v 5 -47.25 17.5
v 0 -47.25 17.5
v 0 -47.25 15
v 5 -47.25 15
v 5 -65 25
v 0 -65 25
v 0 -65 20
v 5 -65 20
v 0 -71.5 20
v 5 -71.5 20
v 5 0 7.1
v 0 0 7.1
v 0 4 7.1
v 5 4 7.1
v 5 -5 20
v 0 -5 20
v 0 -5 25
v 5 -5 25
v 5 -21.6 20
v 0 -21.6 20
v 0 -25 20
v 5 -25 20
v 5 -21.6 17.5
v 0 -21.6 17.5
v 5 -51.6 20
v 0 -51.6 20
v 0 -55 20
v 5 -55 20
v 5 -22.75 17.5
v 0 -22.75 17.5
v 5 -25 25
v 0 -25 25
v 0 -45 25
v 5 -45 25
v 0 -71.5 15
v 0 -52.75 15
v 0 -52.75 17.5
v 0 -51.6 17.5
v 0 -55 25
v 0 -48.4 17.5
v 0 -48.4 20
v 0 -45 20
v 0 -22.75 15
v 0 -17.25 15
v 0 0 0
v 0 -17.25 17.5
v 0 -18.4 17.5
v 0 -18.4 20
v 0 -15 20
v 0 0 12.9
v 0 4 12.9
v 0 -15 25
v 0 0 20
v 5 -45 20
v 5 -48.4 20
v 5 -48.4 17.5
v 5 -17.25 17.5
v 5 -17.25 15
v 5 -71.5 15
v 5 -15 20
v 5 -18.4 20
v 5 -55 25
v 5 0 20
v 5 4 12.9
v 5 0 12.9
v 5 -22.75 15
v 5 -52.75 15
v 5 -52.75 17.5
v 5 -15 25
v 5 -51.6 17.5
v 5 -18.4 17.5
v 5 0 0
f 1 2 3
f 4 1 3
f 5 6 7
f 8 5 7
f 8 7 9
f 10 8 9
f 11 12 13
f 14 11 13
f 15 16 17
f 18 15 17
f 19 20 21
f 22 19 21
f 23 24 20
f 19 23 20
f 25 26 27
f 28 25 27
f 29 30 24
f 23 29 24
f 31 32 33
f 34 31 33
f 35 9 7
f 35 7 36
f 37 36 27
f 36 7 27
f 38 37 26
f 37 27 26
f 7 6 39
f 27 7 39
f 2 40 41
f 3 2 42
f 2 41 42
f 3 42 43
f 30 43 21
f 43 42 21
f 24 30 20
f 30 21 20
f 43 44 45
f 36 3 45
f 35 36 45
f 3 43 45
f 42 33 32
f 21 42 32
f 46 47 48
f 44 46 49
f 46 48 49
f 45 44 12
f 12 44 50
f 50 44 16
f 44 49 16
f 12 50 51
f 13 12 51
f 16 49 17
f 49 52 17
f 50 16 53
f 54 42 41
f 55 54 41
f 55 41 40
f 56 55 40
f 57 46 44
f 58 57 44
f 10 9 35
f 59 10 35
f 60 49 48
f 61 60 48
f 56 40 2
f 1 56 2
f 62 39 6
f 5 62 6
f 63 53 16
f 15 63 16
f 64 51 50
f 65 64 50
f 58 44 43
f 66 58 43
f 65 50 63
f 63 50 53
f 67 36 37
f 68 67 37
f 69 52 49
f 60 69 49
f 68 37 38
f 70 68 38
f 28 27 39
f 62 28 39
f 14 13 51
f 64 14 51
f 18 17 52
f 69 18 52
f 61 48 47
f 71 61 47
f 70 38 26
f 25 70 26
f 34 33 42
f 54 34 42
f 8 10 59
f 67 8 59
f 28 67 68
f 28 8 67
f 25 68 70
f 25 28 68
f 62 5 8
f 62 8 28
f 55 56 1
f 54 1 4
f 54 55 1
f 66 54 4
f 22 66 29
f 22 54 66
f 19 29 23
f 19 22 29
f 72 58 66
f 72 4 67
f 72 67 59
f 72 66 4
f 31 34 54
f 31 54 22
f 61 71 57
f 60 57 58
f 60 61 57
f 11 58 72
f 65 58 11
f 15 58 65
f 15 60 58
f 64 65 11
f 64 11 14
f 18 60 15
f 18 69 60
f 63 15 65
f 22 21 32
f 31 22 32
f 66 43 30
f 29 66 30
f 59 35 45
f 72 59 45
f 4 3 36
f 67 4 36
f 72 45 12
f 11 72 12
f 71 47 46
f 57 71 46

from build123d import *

# Parameters (mm, degrees)
F2_DEPTH = 5


with BuildPart() as f2:
    # F1 (on Right) → F2 (new body)
    with BuildSketch(Plane.YZ):
        Polygon((-71.5, 15), (0, 0), (0, 7.1), (4, 7.1), (4, 12.9), (0, 12.9), (0, 20), (-5, 20), (-5, 25), (-15, 25), (-15, 20), (-18.4, 20), (-18.4, 17.5), (-17.25, 17.5), (-17.25, 15), (-20, 15), (-22.75, 15), (-22.75, 17.5), (-21.6, 17.5), (-21.6, 20), (-25, 20), (-25, 25), (-45, 25), (-45, 20), (-48.4, 20), (-48.4, 17.5), (-47.25, 17.5), (-47.25, 15), (-50, 15), (-52.75, 15), (-52.75, 17.5), (-51.6, 17.5), (-51.6, 20), (-55, 20), (-55, 25), (-65, 25), (-65, 20), (-71.5, 20), align=None)
    extrude(amount=F2_DEPTH)


solid = f2.part
